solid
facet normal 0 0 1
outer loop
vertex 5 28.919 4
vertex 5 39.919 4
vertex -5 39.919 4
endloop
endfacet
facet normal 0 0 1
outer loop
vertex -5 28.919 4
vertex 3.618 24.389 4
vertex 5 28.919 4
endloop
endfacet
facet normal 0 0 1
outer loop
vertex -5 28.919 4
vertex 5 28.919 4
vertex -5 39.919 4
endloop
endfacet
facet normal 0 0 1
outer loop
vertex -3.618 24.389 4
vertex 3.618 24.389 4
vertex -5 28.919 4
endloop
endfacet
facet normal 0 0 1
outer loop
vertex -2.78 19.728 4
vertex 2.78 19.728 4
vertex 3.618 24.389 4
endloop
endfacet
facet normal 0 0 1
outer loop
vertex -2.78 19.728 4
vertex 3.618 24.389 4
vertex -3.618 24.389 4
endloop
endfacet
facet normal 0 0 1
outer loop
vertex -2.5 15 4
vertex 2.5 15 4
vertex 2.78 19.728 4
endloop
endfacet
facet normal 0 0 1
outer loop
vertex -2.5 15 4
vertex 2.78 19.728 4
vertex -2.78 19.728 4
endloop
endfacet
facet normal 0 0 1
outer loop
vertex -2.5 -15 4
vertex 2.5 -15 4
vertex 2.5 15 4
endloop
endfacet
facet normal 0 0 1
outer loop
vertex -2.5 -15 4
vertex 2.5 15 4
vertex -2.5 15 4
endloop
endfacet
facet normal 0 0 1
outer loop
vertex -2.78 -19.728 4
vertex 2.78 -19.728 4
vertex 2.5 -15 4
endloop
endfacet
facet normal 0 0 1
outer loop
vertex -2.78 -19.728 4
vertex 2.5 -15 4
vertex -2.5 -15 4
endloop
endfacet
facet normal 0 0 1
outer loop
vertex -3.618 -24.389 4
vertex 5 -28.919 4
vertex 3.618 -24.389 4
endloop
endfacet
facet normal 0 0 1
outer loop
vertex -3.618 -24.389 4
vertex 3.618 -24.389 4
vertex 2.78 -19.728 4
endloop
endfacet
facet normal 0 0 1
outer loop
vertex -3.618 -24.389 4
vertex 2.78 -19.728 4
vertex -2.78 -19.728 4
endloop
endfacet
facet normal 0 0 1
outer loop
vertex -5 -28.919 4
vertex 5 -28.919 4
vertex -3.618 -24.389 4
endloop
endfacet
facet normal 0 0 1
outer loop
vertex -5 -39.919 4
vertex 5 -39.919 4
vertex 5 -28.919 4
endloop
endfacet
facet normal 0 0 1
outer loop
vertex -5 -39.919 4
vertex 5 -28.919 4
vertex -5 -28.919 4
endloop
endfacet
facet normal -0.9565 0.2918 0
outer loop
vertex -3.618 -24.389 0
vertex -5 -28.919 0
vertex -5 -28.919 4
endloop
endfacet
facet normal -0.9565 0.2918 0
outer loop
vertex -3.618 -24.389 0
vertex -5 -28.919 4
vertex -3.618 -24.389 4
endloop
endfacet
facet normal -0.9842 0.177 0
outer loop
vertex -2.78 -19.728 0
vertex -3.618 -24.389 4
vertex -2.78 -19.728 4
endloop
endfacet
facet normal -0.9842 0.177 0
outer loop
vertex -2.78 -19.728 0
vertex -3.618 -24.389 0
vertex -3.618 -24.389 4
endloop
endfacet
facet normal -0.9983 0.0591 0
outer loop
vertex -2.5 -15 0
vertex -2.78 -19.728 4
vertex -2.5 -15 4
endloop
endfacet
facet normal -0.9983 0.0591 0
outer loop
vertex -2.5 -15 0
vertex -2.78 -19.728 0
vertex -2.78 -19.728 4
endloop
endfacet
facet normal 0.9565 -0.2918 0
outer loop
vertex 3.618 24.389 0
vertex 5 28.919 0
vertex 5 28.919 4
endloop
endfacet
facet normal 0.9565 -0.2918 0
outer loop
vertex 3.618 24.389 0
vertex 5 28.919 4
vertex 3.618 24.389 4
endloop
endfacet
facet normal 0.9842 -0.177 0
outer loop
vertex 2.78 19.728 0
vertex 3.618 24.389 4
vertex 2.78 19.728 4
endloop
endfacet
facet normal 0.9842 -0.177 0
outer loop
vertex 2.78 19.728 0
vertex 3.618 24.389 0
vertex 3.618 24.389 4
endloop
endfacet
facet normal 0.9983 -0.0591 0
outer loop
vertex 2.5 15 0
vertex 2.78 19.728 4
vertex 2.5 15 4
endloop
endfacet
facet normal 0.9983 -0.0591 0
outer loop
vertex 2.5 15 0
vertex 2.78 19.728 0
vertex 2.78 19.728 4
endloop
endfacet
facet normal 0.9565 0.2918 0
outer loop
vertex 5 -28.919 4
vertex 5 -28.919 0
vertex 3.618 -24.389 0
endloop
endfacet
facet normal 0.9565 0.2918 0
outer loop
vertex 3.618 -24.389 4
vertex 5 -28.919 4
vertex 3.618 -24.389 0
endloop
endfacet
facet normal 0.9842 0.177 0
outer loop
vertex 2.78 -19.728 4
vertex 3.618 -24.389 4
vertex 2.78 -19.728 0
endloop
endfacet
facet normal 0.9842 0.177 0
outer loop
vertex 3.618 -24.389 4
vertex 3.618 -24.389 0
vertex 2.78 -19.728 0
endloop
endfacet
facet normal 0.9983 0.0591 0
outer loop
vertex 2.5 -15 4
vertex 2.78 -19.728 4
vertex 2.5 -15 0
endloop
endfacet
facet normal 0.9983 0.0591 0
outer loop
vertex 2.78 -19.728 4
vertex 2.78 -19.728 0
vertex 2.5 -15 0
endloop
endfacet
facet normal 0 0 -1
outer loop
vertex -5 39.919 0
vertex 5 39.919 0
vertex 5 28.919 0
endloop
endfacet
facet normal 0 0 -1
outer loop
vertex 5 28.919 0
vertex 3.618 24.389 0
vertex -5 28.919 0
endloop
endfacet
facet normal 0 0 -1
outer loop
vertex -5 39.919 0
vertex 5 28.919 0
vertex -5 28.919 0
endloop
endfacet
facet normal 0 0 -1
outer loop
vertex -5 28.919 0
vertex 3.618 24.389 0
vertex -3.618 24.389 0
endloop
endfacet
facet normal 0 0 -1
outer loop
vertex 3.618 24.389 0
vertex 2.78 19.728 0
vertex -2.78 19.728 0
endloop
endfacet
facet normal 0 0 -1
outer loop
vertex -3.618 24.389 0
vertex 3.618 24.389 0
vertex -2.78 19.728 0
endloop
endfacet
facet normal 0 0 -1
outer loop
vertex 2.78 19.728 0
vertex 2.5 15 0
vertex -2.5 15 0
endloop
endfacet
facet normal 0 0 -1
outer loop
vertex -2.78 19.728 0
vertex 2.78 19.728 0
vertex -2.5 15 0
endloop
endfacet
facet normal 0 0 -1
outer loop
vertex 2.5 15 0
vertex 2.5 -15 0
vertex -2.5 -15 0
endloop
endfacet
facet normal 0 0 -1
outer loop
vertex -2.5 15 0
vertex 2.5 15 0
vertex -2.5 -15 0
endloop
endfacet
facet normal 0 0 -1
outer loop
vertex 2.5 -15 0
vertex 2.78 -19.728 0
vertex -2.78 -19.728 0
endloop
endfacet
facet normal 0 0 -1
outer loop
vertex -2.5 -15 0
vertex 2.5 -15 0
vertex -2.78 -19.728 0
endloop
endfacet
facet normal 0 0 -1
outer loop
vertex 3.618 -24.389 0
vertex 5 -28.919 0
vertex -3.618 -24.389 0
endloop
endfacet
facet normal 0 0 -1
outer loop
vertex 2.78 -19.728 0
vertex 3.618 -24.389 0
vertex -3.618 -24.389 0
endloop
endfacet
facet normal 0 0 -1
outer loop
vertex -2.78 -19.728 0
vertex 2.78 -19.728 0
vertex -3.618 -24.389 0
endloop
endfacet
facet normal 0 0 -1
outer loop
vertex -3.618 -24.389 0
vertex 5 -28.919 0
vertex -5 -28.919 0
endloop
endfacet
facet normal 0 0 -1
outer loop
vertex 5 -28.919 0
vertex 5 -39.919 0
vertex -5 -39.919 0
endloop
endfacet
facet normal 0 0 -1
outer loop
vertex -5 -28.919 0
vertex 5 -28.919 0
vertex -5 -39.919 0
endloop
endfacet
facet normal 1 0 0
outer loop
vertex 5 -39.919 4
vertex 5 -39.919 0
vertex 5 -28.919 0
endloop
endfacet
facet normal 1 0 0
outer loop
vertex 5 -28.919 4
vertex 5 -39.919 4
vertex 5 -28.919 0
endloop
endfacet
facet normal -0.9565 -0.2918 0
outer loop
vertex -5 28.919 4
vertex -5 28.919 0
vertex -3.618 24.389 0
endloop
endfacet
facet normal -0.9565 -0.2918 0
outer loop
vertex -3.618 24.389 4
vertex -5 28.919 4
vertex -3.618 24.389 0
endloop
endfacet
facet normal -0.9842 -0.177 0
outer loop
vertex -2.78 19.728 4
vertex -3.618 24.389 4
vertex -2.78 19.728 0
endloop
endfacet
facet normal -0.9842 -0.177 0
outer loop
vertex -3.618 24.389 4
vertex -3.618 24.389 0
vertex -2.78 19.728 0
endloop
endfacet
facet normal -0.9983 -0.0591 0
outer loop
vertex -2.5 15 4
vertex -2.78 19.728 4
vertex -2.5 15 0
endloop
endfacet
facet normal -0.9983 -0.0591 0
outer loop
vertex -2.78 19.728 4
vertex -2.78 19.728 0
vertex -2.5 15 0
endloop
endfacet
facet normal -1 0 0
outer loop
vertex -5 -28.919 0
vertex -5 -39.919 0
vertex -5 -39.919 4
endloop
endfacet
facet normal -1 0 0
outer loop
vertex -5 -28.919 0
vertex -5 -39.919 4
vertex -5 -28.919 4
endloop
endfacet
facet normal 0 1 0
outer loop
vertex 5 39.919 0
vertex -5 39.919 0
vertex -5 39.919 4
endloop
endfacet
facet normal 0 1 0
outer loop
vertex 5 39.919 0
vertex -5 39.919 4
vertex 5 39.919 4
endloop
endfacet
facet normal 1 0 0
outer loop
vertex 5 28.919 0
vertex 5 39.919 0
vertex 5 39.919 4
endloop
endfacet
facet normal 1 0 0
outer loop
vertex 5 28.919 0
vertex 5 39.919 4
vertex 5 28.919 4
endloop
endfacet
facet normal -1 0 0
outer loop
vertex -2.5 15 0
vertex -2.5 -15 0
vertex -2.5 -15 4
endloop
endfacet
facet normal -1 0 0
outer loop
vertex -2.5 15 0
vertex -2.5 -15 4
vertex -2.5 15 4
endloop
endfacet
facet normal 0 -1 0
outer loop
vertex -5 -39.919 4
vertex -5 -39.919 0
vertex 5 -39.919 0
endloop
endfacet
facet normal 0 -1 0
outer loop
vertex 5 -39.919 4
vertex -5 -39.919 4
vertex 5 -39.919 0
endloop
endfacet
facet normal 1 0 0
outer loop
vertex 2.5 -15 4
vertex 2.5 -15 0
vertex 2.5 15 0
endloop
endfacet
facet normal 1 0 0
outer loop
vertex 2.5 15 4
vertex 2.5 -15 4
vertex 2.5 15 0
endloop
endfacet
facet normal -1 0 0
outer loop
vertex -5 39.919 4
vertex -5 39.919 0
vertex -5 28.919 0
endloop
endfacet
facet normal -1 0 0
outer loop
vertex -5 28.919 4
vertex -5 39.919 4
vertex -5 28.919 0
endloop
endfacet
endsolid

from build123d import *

# Parameters (mm, degrees)
F1_DEPTH = 4


with BuildPart() as f1:
    # F0 (on Top) → F1 (new body)
    with BuildSketch(Plane.XY):
        with BuildLine():
            Line((-2.5, 15), (-2.5, 0))
            Line((-2.5, 0), (0, 0))
            Line((0, 0), (0, 39.919411))
            Line((0, 39.919411), (-5, 39.919411))
            Line((-5, 39.919411), (-5, 28.919411))
            ThreePointArc((-5, 28.919411), (-3.129961, 22.071068), (-2.5, 15))
        make_face()
    extrude(amount=F1_DEPTH)

    # F2: F1 across face


with BuildPart() as f1_1:
    add(f1.part)
    add(f1.part.mirror(Plane(origin=(0, 19.959705, 2), x_dir=(0, 1, 0), z_dir=(1, 0, 0))))

    # F3: F1 across face


with BuildPart() as f1_2:
    add(f1_1.part)
    add(f1_1.part.mirror(Plane(origin=(0, 0, 2), x_dir=(1, 0, 0), z_dir=(0, -1, 0))))


solid = f1_2.part
